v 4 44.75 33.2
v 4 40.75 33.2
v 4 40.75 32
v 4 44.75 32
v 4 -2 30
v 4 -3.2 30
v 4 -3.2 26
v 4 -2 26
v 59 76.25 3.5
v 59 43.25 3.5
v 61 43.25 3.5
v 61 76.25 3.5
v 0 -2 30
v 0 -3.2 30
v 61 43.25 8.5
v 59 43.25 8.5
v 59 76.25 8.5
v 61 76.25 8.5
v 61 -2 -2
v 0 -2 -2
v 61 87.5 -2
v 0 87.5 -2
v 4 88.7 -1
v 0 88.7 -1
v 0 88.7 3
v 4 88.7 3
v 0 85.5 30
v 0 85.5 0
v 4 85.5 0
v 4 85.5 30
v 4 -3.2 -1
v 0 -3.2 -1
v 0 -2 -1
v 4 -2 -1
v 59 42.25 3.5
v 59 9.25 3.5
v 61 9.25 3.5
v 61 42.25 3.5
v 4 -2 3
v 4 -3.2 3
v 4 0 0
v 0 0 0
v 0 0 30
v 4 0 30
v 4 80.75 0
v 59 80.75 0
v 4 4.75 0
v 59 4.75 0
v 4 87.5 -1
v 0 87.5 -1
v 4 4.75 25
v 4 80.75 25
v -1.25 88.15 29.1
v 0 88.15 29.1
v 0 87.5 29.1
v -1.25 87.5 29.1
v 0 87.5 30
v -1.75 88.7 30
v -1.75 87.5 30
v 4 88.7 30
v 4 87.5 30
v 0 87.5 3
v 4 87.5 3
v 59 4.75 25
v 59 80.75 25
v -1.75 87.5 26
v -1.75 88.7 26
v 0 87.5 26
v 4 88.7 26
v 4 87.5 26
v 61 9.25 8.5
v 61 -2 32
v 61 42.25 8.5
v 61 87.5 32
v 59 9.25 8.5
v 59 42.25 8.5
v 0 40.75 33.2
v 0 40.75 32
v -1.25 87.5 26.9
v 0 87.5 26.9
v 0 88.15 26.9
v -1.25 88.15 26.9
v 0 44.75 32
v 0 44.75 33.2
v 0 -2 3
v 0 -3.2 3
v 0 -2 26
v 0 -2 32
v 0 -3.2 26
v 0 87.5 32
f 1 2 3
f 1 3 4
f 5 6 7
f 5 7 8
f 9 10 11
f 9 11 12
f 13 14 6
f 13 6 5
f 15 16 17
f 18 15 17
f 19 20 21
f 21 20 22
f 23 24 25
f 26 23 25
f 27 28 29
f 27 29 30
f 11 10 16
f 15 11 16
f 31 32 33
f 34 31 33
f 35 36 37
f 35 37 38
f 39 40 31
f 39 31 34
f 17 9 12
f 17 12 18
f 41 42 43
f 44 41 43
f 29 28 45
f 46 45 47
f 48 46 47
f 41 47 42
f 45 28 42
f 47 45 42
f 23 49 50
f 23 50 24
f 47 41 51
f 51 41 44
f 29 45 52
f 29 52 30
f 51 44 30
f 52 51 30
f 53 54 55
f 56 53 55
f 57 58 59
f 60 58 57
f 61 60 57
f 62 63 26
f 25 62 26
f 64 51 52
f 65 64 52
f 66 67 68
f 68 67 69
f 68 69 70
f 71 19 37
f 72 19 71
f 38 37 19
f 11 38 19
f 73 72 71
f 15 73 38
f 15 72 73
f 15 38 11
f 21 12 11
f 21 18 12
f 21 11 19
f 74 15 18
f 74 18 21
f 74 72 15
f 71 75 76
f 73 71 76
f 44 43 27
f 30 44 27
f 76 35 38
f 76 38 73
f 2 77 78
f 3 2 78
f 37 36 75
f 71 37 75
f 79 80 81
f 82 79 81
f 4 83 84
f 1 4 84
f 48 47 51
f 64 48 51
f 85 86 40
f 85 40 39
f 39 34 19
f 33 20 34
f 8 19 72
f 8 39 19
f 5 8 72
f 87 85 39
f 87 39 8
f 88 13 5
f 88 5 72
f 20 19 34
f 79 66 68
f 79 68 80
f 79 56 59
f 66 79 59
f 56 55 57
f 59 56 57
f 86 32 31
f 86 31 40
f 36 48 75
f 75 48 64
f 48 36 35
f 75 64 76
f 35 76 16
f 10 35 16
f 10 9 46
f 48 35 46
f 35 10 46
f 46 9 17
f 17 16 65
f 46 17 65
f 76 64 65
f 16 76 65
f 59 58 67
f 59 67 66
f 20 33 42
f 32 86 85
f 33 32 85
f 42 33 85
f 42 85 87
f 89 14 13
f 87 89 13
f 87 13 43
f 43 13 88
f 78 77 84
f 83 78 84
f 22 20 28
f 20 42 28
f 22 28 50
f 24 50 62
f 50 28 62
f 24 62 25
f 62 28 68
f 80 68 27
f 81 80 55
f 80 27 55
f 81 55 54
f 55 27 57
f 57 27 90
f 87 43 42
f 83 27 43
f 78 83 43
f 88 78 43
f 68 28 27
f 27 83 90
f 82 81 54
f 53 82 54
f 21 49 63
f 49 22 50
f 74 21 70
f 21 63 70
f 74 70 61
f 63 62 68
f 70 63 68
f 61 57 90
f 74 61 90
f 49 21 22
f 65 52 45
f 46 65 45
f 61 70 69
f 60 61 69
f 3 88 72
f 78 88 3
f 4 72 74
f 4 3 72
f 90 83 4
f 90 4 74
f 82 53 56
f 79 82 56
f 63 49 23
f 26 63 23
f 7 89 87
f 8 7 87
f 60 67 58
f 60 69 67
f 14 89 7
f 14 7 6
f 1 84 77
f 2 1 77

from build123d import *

# Parameters (mm, degrees)
F0_W     = 85.5
F0_H     = 30
F0_W_2   = 1.2
F0_H_2   = 4
F1_DEPTH = 4
F2_W     = 89.5
F2_H     = 34
F3_DEPTH = 55
F4_W     = 89.5
F4_H     = 34
F4_W_2   = 33
F4_H_2   = 5
F5_DEPTH = 2
F7_DEPTH = 1.25
F8_W     = 1.2
F8_H     = 4
F9_DEPTH = 0.5


with BuildPart() as f1:
    # F0 (on Right) → F1 (new body)
    with BuildSketch(Plane.YZ):
        Polygon((40.75, 32), (-2, 32), (-2, 30), (-2, 26), (-2, 3), (-2, -1), (-2, -2), (87.5, -2), (87.5, -1), (87.5, 3), (87.5, 26), (87.5, 30), (87.5, 32), (44.75, 32), align=None)
        with Locations((42.75, 15)):
            Rectangle(F0_W, F0_H, mode=Mode.SUBTRACT)
        Polygon((40.75, 33.2), (40.75, 32), (44.75, 32), (44.75, 33.2), (42.75, 33.2), align=None)
        with Locations((-2.6, 28)):
            Rectangle(F0_W_2, F0_H_2)
        with Locations((-2.6, 1)):
            Rectangle(F0_W_2, F0_H_2)
        with Locations((88.1, 28)):
            Rectangle(F0_W_2, F0_H_2)
        with Locations((88.1, 1)):
            Rectangle(F0_W_2, F0_H_2)
    extrude(amount=F1_DEPTH)

    # F2 (on face) → F3 (join)
    with BuildSketch(Plane.YZ.offset(4)):
        with Locations((42.75, 15)):
            Rectangle(F2_W, F2_H)
        Polygon((42.75, 0), (4.75, 0), (4.75, 25), (42.75, 25), (80.75, 25), (80.75, 0), align=None, mode=Mode.SUBTRACT)
    extrude(amount=F3_DEPTH)

    # F4 (on face) → F5 (join)
    with BuildSketch(Plane.YZ.offset(59)):
        with Locations((42.75, 15)):
            Rectangle(F4_W, F4_H)
        with Locations((25.75, 6)):
            Rectangle(F4_W_2, F4_H_2, mode=Mode.SUBTRACT)
        with Locations((59.75, 6)):
            Rectangle(F4_W_2, F4_H_2, mode=Mode.SUBTRACT)
    extrude(amount=F5_DEPTH)

    # F6 (on face) → F7 (join)
    with BuildSketch(Plane(origin=(0, 0, 0), x_dir=(0, -1, 0), z_dir=(-1, 0, 0))):
        Polygon((-87.5, 29.1), (-87.5, 30), (-88.7, 30), (-88.7, 26), (-87.5, 26), (-87.5, 26.9), (-88.15, 26.9), (-88.15, 29.1), align=None)
    extrude(amount=F7_DEPTH)

    # F8 (on face) → F9 (join)
    with BuildSketch(Plane(origin=(-1.25, 0, 0), x_dir=(0, -1, 0), z_dir=(-1, 0, 0))):
        with Locations((-88.1, 28)):
            Rectangle(F8_W, F8_H)
    extrude(amount=F9_DEPTH)


solid = f1.part
